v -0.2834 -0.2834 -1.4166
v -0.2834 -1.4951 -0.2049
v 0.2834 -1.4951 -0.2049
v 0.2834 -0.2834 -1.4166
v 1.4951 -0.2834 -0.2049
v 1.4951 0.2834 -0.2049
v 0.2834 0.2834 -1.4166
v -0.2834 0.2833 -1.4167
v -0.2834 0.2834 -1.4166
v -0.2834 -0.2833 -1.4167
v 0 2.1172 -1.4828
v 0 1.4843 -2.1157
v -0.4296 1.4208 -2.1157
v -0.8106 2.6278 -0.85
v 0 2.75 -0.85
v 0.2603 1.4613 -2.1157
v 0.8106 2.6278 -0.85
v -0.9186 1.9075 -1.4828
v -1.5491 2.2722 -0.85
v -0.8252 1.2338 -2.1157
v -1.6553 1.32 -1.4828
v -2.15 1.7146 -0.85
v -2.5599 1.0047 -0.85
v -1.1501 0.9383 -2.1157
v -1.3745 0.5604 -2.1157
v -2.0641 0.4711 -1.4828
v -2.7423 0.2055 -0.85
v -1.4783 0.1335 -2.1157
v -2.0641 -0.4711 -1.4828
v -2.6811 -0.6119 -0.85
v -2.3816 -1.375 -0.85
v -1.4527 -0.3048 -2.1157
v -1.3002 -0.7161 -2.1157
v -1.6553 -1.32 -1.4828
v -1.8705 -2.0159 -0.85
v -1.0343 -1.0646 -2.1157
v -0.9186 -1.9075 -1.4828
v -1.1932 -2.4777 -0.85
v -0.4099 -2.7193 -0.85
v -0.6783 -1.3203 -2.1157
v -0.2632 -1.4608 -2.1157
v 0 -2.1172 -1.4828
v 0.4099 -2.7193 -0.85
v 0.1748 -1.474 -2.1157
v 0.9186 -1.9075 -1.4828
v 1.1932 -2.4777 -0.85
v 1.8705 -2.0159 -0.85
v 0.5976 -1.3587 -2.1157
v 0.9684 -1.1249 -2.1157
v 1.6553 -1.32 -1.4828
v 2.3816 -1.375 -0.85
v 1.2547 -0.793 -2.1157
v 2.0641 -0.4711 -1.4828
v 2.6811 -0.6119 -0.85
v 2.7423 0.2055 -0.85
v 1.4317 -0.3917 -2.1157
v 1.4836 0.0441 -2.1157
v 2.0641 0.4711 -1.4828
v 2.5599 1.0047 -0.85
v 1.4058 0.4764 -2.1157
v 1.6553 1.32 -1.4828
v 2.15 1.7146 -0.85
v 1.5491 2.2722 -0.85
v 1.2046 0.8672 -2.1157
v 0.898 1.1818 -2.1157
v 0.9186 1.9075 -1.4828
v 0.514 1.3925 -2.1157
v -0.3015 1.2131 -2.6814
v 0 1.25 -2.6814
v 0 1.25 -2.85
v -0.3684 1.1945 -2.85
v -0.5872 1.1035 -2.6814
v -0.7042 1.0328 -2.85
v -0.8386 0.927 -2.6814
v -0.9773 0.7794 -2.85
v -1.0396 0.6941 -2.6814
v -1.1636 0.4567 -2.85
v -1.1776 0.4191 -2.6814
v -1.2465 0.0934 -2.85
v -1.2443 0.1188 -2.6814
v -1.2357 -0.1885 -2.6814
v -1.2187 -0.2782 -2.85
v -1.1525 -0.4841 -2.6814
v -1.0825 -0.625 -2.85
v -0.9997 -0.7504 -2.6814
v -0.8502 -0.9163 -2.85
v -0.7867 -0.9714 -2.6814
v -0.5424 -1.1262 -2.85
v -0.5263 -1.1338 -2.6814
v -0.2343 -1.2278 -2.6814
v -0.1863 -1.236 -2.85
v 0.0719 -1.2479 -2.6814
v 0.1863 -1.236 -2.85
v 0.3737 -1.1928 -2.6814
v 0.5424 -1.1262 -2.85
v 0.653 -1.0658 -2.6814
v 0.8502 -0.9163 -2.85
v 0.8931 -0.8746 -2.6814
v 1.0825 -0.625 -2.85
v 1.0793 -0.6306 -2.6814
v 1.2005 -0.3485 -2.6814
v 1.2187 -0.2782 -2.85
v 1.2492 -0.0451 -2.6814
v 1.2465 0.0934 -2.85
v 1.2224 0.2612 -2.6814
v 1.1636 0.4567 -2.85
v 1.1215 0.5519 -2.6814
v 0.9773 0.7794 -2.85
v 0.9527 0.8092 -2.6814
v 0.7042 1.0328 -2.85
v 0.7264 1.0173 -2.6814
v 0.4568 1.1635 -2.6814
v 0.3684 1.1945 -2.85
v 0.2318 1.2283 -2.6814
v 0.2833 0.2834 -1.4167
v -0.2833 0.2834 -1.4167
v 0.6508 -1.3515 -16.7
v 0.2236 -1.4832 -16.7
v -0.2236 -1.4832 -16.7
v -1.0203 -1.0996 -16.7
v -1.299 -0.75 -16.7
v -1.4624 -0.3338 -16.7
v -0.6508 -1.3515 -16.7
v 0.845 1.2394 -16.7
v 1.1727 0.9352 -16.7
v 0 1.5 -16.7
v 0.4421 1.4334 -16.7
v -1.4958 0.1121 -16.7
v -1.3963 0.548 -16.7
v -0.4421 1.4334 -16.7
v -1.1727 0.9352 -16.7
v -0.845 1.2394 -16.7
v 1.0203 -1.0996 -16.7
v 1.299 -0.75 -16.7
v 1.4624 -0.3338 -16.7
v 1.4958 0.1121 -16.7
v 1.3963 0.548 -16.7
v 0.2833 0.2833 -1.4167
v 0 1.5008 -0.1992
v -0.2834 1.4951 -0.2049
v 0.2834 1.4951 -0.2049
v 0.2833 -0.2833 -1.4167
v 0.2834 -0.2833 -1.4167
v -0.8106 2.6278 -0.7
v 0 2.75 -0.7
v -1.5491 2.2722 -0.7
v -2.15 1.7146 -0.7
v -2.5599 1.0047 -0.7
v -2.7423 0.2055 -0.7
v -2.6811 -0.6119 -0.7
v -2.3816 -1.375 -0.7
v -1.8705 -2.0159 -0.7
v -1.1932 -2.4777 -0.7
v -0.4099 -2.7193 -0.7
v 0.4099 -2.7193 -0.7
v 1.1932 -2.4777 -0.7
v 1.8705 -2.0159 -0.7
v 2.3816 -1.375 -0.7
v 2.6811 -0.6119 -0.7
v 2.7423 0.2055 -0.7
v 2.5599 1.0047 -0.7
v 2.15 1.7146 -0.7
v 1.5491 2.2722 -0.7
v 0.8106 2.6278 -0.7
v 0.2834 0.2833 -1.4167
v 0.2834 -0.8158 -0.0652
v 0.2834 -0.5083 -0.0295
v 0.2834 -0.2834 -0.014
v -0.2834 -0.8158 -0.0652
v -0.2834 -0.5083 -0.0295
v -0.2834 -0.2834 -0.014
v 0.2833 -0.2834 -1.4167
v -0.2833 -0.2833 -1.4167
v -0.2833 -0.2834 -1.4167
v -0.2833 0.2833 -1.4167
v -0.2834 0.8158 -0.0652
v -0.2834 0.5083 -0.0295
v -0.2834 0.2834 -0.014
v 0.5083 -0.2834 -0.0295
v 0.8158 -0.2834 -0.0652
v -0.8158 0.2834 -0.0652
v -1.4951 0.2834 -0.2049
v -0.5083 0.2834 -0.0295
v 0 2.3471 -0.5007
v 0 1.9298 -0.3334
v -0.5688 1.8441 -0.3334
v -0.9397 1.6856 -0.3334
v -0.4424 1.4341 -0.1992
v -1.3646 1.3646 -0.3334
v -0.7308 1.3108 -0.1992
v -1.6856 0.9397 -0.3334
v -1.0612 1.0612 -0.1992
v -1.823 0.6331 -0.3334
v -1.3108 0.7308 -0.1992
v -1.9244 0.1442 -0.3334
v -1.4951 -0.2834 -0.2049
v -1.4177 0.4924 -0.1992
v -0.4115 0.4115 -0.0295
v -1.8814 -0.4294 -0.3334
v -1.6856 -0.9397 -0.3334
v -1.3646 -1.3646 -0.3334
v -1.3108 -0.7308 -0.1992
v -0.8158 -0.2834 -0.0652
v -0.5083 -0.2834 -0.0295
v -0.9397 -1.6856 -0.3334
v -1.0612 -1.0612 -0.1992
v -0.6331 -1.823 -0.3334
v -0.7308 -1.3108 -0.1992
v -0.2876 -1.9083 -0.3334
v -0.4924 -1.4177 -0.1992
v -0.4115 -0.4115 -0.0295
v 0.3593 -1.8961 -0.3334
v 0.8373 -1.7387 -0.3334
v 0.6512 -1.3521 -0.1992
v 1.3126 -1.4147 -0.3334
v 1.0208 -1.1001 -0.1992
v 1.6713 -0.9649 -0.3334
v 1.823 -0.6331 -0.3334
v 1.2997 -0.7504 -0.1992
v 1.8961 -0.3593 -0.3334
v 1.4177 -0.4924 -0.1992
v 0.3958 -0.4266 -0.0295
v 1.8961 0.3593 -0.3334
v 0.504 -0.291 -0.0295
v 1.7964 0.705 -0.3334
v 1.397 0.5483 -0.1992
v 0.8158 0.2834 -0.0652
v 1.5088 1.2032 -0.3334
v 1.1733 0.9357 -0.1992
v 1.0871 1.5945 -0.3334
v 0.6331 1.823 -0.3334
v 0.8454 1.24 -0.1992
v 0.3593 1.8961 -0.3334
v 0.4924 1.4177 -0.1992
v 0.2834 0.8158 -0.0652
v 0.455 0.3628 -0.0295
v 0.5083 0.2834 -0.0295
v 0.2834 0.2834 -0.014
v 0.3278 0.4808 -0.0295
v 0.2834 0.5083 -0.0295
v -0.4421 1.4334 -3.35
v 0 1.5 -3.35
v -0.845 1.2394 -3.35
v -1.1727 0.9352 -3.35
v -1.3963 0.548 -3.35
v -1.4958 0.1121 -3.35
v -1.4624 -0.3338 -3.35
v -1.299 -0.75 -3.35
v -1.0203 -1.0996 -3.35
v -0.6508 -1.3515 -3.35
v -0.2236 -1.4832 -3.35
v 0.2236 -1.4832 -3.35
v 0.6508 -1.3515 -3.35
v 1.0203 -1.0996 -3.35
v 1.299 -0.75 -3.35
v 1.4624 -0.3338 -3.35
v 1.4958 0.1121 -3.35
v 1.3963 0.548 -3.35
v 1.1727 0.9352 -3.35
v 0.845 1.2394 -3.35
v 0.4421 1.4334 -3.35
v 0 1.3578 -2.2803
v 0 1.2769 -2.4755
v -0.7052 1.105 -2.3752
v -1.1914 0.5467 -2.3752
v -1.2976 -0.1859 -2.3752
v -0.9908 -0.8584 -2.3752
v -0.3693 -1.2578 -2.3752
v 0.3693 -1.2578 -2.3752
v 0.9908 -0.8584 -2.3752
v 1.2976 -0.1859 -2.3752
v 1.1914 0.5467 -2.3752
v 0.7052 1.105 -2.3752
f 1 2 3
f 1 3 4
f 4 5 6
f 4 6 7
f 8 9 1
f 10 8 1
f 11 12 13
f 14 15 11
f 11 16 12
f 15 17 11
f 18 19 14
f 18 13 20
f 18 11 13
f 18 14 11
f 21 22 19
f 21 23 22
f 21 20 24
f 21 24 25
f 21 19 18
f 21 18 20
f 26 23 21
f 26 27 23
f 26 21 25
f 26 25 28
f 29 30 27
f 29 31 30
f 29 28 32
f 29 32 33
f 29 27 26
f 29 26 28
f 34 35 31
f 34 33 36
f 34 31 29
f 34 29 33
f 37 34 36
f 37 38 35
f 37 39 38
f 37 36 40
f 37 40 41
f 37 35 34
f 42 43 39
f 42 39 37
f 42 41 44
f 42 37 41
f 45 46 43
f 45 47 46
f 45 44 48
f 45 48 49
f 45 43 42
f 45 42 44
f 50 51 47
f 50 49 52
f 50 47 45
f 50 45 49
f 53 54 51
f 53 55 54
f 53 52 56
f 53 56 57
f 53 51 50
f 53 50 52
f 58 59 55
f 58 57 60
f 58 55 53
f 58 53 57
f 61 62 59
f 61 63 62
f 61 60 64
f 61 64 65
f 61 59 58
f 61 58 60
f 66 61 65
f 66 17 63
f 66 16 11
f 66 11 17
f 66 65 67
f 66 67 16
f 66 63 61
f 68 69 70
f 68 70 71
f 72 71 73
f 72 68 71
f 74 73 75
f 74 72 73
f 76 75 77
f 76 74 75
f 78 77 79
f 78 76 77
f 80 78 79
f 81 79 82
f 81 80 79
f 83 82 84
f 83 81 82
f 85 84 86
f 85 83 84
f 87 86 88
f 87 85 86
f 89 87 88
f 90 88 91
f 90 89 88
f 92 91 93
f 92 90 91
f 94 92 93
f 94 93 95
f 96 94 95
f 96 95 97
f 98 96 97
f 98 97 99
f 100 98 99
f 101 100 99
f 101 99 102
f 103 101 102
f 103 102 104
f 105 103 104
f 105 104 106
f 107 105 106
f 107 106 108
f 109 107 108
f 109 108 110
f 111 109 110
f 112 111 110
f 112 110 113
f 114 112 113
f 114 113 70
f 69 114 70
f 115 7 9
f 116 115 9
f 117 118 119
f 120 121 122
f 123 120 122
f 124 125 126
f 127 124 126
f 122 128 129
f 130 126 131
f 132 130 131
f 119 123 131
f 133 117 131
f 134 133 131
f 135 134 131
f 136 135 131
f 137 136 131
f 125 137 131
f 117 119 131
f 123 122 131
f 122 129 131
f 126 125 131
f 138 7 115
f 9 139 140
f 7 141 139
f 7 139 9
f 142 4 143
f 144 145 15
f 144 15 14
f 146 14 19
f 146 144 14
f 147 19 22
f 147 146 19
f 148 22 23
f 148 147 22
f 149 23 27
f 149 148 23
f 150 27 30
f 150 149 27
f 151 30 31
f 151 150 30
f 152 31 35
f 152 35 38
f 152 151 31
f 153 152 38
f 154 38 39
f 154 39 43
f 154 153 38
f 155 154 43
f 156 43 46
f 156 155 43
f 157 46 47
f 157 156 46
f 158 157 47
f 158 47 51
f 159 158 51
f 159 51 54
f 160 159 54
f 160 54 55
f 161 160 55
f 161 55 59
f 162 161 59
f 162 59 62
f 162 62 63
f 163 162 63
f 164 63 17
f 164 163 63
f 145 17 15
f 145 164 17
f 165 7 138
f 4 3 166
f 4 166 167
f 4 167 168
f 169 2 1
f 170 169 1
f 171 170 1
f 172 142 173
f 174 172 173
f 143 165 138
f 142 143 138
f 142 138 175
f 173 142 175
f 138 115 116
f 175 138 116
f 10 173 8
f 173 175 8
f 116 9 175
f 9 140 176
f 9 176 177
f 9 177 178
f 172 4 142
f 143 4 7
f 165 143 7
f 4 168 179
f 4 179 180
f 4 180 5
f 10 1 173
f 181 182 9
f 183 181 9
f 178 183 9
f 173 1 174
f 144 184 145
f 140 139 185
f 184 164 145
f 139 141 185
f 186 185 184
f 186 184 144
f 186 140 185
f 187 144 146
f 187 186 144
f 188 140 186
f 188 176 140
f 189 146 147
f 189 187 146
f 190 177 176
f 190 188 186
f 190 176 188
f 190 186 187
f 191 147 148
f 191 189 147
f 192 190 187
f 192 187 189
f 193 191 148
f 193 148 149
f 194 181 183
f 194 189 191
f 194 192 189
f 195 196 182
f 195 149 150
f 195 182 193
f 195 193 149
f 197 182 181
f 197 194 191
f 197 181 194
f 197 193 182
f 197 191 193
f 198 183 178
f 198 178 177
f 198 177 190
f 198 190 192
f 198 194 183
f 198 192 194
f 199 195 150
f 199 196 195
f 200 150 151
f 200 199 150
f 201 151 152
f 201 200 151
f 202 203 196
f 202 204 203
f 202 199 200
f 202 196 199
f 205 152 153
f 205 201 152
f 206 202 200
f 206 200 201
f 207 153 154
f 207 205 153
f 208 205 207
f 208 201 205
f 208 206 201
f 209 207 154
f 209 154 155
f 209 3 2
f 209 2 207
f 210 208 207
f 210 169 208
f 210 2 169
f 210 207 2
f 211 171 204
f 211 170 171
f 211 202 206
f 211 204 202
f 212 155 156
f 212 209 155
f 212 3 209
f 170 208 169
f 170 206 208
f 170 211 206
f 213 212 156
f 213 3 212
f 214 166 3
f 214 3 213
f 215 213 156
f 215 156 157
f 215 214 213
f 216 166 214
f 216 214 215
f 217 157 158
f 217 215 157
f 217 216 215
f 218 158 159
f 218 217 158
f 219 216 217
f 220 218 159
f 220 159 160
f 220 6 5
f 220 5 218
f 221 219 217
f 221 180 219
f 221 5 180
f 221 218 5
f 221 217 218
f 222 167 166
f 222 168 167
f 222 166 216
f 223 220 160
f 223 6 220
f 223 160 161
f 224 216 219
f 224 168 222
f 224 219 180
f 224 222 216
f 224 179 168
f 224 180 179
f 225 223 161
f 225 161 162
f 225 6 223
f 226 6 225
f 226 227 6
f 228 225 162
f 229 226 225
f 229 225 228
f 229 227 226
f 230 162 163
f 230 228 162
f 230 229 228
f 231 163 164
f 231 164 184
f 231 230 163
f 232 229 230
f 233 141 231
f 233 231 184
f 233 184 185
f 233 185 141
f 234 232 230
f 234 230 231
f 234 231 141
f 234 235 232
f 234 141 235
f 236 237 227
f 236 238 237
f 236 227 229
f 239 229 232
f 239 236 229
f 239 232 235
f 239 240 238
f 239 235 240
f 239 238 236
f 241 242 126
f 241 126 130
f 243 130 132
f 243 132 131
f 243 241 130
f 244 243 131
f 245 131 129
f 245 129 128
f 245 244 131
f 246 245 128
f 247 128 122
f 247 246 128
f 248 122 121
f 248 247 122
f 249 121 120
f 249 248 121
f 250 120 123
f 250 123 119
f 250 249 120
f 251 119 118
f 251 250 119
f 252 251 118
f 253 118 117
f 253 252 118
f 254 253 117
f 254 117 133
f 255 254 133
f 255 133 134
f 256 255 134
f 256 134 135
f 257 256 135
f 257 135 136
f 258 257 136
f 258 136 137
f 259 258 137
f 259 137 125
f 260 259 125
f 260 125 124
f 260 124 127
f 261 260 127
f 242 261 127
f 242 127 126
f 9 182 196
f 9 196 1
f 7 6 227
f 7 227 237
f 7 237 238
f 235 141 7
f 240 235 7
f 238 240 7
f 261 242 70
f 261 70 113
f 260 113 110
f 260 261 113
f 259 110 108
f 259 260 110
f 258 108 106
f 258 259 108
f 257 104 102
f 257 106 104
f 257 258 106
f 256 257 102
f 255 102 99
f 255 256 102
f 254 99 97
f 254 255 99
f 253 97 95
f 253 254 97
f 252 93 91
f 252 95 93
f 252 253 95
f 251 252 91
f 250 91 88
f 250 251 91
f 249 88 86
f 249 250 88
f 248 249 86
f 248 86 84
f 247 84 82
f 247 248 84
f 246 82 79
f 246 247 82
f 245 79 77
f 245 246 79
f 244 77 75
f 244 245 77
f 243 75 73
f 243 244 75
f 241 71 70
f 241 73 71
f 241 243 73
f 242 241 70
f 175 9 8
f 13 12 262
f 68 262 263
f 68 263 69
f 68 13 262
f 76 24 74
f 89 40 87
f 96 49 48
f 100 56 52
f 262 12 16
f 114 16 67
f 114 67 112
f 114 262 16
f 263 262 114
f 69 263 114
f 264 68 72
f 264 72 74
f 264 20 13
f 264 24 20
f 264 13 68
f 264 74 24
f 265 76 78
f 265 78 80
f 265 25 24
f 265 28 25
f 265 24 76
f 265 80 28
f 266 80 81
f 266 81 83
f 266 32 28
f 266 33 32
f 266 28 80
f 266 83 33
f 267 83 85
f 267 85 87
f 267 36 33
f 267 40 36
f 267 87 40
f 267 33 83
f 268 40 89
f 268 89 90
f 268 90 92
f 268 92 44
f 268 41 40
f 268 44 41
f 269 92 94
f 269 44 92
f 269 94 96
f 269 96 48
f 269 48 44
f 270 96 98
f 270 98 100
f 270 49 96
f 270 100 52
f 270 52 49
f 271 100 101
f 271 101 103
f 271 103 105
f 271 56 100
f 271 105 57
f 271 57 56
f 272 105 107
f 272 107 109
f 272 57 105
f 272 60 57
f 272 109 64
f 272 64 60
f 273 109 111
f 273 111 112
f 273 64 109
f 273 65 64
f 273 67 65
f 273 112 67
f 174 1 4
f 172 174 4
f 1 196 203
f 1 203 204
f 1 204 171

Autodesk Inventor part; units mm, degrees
ref_plane "WorkPlane2" through (0, 0, 0) normal (0, 0, 1) x (1, 0, 0)
sketch "Sketch1" plane through (0, 0, 0) normal (1, 0, 0) x (0, 1, 0)
  point P0 (0, 0)
ref_plane "Work Plane2" through (0, 0, -2.35) normal (0, 0, 1) x (1, 0, 0)
ref_plane "WorkPlane3" through (0, 0, 7) normal (0, 0, 1) x (1, 0, 0)
sketch "Sketch2" plane through (0, 0, 0) normal (0, 1, 0) x (-1, 0, 0)
  point P0 (0, 0)
sketch "Sketch3" plane through (0, 0, 0) normal (1, 0, 0) x (0, 1, 0)
  line L0 (1.5, -3.35) -> (1.25, -2.85)
  line L1 (1.5, -16.7) -> (1.5, -3.35)
  line L2 (0, -16.7) -> (1.5, -16.7)
  line L3 (0, 0) -> (0, -16.7)
  arc A0 (2.75, -0.7) -> (0, 0) centre (0, -5.7518) ccw
  line L4 (2.75, -0.85) -> (2.75, -0.7)
  line L5 (1.25, -2.35) -> (2.75, -0.85)
  line L6 (1.25, -2.85) -> (1.25, -2.35)
  line L7 (0, -31.6445) -> (0, 31.6445) construction
  line L8 (0, -31.6445) -> (0, 31.6445)
  line L9 (0, -44.3023) -> (0, 44.3023) projected
  dimension "d2" = 1.5
  dimension "d4" = 1.25
  dimension "d6" = 0.5
  dimension "d8" = 1.65
  dimension "d10" = 135
  dimension "d12" = 2.75
  dimension "d14" = 0
  dimension "d16" = 0.7
  dimension "d18" = 16
  dimension "d22" = 13.35
revolve "Revolution1" add sketch "Sketch3" angle 360 about axis through (0, 0, -31.6445) along (0, 0, 1)
fillet "Fillet1" radius 0.8 1 edges at (0, -1.25, -2.35)
sketch "Sketch4" plane through (0, 0, 0) normal (0, 1, 0) x (-1, 0, 0)
  line L0 (0, 0) -> (-1.7, 0)
  line L1 (0, -1.4167) -> (0, 0)
  line L2 (-1.7, 0) -> (-0.2833, -1.4167)
  line L3 (0, -6.9021) -> (0, 1.1504) projected
  arc A0 (2.75, -0.7) -> (-2.75, -0.7) centre (0, -5.7518) ccw projected
  line L4 (0, -1.4167) -> (-0.2833, -1.4167)
  point P0 (0, -1.7)
  dimension "d30" = 45
  dimension "d33" = 3.4
  dimension "d34" = 0.2833
  dimension "d35" = 90
extrude "Extrusion1" cut sketch "Sketch4" along normal mid plane 0.5667
pattern_circular "PolarArray1" count 4 over 360 about axis through (0, 0, -10) along (0, 0, 1) of "Extrusion1"
thread "Thread1" size "M3x0.5" class "6g" standard "ISO Metric profile" full length
ref_plane "MSC_PF1" through (0, 0, 0) normal (1, 0, 0) x (0, 1, 0)
ref_plane "MSC_PT1" through (0, 2.75, -0.85) normal (0, 0, -1) x (-1, 0, 0)
equation "\"d2\" = 0.5 * NND"
equation "\"d4\" = 0.5 * msp_mdtds"
equation "\"d6\" = msp_x"
equation "\"d8\" = ParK"
equation "\"d12\" = 0.5 * Dk"
equation "\"d16\" = ParF"
equation "\"d18\" = NLG"
equation "\"d22\" = b"
equation "\"d24\" = r"
equation "\"d33\" = M"
equation "\"d34\" = 0.0833333 * M"
equation "\"d31\" = 0.166667 * M"
equation "\"d39\" = b"
equation "\"PTC\" = 0.5"
equation "\"msp_x\" = PTC"
equation "\"NLG\" = 16"
equation "\"NND\" = 3"
equation "\"ParK\" = 1.65"
equation "\"r\" = 0.8"
equation "\"msp_mdtds\" = NND - PTC"
equation "\"b\" = 13.35"
equation "\"Dk\" = 5.5"
equation "\"ParF\" = 0.7"
equation "\"M\" = 3.4"
equation "\"ParA\" = 1"
equation "\"THREADDIA\" = NND"
equation "\"TEMPLATE\" = 1.2345"
properties part number "ISO 7047 - M3x16 - 4.8 - H" material "Steel"
